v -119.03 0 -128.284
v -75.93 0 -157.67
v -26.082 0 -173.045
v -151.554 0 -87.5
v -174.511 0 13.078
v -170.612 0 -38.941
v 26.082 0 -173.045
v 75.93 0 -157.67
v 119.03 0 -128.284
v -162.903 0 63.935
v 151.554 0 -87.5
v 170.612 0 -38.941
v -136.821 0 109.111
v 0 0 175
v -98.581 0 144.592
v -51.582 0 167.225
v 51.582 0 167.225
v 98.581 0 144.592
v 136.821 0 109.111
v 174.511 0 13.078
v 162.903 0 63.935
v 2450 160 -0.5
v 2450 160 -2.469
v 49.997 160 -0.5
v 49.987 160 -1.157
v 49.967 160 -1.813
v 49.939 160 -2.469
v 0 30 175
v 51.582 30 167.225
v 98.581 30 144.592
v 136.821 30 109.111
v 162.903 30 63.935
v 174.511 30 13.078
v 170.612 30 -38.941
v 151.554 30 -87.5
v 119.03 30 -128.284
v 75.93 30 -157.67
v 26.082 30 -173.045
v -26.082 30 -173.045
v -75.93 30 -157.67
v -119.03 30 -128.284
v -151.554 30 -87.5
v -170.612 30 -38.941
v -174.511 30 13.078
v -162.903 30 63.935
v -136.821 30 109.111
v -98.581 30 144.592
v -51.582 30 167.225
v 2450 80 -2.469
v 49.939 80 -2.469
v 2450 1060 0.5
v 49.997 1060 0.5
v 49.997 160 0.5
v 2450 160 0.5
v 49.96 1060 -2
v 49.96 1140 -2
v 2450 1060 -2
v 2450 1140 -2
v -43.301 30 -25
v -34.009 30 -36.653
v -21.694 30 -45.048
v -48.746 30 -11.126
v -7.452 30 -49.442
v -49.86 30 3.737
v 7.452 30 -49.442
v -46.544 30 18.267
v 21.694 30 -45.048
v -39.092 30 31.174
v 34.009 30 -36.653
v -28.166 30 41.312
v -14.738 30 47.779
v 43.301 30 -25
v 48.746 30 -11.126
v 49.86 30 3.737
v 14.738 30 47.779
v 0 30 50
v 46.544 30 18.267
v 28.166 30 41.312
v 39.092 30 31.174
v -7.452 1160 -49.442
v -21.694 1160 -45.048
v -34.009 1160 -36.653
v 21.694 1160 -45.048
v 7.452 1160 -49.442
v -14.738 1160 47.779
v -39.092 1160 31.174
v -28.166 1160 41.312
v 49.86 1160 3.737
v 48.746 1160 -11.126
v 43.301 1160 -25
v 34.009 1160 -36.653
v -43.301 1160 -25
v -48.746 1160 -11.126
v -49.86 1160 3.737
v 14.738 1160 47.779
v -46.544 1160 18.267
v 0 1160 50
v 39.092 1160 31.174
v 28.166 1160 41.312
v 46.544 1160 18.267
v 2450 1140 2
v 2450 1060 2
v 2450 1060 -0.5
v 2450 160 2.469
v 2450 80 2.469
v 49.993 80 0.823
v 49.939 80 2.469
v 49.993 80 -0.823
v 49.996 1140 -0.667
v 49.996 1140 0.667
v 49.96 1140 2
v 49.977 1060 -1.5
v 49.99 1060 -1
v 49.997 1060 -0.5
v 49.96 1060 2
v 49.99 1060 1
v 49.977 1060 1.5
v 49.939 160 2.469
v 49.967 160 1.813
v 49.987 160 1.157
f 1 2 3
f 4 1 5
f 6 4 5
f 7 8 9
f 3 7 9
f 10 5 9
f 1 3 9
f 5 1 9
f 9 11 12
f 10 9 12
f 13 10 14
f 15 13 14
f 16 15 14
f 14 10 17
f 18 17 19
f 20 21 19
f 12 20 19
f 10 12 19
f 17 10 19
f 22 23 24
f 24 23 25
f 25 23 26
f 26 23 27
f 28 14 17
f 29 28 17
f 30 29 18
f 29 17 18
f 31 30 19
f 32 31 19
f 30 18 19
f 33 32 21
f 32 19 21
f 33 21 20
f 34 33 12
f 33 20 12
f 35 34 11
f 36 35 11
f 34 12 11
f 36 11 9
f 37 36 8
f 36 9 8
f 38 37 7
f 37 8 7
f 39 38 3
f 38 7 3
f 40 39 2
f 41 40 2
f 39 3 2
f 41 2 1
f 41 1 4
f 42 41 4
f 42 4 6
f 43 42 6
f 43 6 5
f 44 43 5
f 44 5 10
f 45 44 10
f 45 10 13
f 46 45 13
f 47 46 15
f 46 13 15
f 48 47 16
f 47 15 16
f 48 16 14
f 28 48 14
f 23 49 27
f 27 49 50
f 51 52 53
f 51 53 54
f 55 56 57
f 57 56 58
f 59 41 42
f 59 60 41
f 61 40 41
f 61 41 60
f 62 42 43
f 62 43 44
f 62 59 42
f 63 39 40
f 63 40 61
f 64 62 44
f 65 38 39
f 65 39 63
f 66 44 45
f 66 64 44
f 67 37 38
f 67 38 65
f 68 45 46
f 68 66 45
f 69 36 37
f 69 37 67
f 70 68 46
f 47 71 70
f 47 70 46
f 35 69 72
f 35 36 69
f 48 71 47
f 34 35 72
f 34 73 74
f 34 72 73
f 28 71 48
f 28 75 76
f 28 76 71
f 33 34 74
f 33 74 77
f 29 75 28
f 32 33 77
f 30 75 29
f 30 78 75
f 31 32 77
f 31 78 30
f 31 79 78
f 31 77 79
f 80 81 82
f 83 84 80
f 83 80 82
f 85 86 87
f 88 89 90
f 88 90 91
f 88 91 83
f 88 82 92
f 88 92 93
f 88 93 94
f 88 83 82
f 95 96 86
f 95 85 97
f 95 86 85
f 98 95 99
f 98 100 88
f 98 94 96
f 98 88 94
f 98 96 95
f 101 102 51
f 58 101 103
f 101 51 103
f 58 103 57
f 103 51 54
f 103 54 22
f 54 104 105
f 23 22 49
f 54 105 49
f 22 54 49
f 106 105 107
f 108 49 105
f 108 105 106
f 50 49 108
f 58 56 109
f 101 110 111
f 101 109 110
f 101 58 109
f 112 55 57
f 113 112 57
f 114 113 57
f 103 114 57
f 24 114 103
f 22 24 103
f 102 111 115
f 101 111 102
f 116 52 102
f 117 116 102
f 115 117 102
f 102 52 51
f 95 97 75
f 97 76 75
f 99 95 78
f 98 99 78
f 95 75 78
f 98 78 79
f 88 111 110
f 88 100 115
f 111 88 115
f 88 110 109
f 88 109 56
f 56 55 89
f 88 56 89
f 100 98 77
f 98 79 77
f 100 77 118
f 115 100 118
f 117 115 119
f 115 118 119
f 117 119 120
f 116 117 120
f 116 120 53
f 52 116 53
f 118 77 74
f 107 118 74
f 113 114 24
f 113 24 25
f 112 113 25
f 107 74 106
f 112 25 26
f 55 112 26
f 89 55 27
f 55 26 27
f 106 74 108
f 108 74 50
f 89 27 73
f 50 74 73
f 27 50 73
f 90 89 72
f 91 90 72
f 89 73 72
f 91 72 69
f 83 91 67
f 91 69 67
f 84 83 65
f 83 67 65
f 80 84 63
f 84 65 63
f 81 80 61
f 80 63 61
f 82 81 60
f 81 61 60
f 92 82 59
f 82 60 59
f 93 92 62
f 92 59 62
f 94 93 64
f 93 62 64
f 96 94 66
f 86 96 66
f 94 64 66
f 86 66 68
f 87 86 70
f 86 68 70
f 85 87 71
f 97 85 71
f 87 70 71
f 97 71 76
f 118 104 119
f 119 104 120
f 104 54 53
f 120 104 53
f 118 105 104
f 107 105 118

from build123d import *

# Parameters (mm, degrees)
SKETCH2_R           = 175
BOSS_EXTRUDE1_DEPTH = 30
SKETCH3_R           = 50
BOSS_EXTRUDE2_DEPTH = 1110
SKETCH7_W           = 2450
SKETCH7_H           = 1
BOSS_EXTRUDE3_DEPTH = 1060
SKETCH8_W           = 2450
SKETCH8_H           = 4
BOSS_EXTRUDE4_DEPTH = 80
SKETCH11_W          = 2450
SKETCH11_H          = 4.938385514
BOSS_EXTRUDE5_DEPTH = 80
SKETCH12_R          = 50
BOSS_EXTRUDE6_DEPTH = 20


with BuildPart() as part:
    # Sketch2 → Boss-Extrude1 (new body)
    with BuildSketch(Plane(origin=(0, 0, 0), x_dir=(1, 0, 0), z_dir=(0, 1, 0))):
        with Locations(Location((0, 0, 0), (0, 0, 270))):
            Circle(SKETCH2_R)
    extrude(amount=BOSS_EXTRUDE1_DEPTH)

    # Sketch3 → Boss-Extrude2 (add)
    with BuildSketch(Plane(origin=(0, 30, 0), x_dir=(1, 0, 0), z_dir=(0, 1, 0))):
        with Locations(Location((0, 0, 0), (0, 0, 270))):
            Circle(SKETCH3_R)
    extrude(amount=BOSS_EXTRUDE2_DEPTH)

    # Sketch7 → Boss-Extrude3 (add)
    with BuildSketch(Plane(origin=(0, 1140, 0), x_dir=(1, 0, 0), z_dir=(0, 1, 0))):
        with Locations((1225, 0)):
            Rectangle(SKETCH7_W, SKETCH7_H)
    extrude(amount=-BOSS_EXTRUDE3_DEPTH)

    # Sketch8 → Boss-Extrude4 (add)
    with BuildSketch(Plane(origin=(0, 1140, 0), x_dir=(1, 0, 0), z_dir=(0, 1, 0))):
        with Locations((1225, 0)):
            Rectangle(SKETCH8_W, SKETCH8_H)
    extrude(amount=-BOSS_EXTRUDE4_DEPTH)

    # Sketch11 → Boss-Extrude5 (add)
    with BuildSketch(Plane(origin=(0, 80, 0), x_dir=(-1, 0, 0), z_dir=(0, -1, 0))):
        with Locations((-1225, 0)):
            Rectangle(SKETCH11_W, SKETCH11_H)
    extrude(amount=-BOSS_EXTRUDE5_DEPTH)

    # Sketch12 → Boss-Extrude6 (add)
    with BuildSketch(Plane(origin=(0, 1140, 0), x_dir=(1, 0, 0), z_dir=(0, 1, 0))):
        with Locations(Location((0, 0, 0), (0, 0, 270))):
            Circle(SKETCH12_R)
    extrude(amount=BOSS_EXTRUDE6_DEPTH)


solid = part.part
